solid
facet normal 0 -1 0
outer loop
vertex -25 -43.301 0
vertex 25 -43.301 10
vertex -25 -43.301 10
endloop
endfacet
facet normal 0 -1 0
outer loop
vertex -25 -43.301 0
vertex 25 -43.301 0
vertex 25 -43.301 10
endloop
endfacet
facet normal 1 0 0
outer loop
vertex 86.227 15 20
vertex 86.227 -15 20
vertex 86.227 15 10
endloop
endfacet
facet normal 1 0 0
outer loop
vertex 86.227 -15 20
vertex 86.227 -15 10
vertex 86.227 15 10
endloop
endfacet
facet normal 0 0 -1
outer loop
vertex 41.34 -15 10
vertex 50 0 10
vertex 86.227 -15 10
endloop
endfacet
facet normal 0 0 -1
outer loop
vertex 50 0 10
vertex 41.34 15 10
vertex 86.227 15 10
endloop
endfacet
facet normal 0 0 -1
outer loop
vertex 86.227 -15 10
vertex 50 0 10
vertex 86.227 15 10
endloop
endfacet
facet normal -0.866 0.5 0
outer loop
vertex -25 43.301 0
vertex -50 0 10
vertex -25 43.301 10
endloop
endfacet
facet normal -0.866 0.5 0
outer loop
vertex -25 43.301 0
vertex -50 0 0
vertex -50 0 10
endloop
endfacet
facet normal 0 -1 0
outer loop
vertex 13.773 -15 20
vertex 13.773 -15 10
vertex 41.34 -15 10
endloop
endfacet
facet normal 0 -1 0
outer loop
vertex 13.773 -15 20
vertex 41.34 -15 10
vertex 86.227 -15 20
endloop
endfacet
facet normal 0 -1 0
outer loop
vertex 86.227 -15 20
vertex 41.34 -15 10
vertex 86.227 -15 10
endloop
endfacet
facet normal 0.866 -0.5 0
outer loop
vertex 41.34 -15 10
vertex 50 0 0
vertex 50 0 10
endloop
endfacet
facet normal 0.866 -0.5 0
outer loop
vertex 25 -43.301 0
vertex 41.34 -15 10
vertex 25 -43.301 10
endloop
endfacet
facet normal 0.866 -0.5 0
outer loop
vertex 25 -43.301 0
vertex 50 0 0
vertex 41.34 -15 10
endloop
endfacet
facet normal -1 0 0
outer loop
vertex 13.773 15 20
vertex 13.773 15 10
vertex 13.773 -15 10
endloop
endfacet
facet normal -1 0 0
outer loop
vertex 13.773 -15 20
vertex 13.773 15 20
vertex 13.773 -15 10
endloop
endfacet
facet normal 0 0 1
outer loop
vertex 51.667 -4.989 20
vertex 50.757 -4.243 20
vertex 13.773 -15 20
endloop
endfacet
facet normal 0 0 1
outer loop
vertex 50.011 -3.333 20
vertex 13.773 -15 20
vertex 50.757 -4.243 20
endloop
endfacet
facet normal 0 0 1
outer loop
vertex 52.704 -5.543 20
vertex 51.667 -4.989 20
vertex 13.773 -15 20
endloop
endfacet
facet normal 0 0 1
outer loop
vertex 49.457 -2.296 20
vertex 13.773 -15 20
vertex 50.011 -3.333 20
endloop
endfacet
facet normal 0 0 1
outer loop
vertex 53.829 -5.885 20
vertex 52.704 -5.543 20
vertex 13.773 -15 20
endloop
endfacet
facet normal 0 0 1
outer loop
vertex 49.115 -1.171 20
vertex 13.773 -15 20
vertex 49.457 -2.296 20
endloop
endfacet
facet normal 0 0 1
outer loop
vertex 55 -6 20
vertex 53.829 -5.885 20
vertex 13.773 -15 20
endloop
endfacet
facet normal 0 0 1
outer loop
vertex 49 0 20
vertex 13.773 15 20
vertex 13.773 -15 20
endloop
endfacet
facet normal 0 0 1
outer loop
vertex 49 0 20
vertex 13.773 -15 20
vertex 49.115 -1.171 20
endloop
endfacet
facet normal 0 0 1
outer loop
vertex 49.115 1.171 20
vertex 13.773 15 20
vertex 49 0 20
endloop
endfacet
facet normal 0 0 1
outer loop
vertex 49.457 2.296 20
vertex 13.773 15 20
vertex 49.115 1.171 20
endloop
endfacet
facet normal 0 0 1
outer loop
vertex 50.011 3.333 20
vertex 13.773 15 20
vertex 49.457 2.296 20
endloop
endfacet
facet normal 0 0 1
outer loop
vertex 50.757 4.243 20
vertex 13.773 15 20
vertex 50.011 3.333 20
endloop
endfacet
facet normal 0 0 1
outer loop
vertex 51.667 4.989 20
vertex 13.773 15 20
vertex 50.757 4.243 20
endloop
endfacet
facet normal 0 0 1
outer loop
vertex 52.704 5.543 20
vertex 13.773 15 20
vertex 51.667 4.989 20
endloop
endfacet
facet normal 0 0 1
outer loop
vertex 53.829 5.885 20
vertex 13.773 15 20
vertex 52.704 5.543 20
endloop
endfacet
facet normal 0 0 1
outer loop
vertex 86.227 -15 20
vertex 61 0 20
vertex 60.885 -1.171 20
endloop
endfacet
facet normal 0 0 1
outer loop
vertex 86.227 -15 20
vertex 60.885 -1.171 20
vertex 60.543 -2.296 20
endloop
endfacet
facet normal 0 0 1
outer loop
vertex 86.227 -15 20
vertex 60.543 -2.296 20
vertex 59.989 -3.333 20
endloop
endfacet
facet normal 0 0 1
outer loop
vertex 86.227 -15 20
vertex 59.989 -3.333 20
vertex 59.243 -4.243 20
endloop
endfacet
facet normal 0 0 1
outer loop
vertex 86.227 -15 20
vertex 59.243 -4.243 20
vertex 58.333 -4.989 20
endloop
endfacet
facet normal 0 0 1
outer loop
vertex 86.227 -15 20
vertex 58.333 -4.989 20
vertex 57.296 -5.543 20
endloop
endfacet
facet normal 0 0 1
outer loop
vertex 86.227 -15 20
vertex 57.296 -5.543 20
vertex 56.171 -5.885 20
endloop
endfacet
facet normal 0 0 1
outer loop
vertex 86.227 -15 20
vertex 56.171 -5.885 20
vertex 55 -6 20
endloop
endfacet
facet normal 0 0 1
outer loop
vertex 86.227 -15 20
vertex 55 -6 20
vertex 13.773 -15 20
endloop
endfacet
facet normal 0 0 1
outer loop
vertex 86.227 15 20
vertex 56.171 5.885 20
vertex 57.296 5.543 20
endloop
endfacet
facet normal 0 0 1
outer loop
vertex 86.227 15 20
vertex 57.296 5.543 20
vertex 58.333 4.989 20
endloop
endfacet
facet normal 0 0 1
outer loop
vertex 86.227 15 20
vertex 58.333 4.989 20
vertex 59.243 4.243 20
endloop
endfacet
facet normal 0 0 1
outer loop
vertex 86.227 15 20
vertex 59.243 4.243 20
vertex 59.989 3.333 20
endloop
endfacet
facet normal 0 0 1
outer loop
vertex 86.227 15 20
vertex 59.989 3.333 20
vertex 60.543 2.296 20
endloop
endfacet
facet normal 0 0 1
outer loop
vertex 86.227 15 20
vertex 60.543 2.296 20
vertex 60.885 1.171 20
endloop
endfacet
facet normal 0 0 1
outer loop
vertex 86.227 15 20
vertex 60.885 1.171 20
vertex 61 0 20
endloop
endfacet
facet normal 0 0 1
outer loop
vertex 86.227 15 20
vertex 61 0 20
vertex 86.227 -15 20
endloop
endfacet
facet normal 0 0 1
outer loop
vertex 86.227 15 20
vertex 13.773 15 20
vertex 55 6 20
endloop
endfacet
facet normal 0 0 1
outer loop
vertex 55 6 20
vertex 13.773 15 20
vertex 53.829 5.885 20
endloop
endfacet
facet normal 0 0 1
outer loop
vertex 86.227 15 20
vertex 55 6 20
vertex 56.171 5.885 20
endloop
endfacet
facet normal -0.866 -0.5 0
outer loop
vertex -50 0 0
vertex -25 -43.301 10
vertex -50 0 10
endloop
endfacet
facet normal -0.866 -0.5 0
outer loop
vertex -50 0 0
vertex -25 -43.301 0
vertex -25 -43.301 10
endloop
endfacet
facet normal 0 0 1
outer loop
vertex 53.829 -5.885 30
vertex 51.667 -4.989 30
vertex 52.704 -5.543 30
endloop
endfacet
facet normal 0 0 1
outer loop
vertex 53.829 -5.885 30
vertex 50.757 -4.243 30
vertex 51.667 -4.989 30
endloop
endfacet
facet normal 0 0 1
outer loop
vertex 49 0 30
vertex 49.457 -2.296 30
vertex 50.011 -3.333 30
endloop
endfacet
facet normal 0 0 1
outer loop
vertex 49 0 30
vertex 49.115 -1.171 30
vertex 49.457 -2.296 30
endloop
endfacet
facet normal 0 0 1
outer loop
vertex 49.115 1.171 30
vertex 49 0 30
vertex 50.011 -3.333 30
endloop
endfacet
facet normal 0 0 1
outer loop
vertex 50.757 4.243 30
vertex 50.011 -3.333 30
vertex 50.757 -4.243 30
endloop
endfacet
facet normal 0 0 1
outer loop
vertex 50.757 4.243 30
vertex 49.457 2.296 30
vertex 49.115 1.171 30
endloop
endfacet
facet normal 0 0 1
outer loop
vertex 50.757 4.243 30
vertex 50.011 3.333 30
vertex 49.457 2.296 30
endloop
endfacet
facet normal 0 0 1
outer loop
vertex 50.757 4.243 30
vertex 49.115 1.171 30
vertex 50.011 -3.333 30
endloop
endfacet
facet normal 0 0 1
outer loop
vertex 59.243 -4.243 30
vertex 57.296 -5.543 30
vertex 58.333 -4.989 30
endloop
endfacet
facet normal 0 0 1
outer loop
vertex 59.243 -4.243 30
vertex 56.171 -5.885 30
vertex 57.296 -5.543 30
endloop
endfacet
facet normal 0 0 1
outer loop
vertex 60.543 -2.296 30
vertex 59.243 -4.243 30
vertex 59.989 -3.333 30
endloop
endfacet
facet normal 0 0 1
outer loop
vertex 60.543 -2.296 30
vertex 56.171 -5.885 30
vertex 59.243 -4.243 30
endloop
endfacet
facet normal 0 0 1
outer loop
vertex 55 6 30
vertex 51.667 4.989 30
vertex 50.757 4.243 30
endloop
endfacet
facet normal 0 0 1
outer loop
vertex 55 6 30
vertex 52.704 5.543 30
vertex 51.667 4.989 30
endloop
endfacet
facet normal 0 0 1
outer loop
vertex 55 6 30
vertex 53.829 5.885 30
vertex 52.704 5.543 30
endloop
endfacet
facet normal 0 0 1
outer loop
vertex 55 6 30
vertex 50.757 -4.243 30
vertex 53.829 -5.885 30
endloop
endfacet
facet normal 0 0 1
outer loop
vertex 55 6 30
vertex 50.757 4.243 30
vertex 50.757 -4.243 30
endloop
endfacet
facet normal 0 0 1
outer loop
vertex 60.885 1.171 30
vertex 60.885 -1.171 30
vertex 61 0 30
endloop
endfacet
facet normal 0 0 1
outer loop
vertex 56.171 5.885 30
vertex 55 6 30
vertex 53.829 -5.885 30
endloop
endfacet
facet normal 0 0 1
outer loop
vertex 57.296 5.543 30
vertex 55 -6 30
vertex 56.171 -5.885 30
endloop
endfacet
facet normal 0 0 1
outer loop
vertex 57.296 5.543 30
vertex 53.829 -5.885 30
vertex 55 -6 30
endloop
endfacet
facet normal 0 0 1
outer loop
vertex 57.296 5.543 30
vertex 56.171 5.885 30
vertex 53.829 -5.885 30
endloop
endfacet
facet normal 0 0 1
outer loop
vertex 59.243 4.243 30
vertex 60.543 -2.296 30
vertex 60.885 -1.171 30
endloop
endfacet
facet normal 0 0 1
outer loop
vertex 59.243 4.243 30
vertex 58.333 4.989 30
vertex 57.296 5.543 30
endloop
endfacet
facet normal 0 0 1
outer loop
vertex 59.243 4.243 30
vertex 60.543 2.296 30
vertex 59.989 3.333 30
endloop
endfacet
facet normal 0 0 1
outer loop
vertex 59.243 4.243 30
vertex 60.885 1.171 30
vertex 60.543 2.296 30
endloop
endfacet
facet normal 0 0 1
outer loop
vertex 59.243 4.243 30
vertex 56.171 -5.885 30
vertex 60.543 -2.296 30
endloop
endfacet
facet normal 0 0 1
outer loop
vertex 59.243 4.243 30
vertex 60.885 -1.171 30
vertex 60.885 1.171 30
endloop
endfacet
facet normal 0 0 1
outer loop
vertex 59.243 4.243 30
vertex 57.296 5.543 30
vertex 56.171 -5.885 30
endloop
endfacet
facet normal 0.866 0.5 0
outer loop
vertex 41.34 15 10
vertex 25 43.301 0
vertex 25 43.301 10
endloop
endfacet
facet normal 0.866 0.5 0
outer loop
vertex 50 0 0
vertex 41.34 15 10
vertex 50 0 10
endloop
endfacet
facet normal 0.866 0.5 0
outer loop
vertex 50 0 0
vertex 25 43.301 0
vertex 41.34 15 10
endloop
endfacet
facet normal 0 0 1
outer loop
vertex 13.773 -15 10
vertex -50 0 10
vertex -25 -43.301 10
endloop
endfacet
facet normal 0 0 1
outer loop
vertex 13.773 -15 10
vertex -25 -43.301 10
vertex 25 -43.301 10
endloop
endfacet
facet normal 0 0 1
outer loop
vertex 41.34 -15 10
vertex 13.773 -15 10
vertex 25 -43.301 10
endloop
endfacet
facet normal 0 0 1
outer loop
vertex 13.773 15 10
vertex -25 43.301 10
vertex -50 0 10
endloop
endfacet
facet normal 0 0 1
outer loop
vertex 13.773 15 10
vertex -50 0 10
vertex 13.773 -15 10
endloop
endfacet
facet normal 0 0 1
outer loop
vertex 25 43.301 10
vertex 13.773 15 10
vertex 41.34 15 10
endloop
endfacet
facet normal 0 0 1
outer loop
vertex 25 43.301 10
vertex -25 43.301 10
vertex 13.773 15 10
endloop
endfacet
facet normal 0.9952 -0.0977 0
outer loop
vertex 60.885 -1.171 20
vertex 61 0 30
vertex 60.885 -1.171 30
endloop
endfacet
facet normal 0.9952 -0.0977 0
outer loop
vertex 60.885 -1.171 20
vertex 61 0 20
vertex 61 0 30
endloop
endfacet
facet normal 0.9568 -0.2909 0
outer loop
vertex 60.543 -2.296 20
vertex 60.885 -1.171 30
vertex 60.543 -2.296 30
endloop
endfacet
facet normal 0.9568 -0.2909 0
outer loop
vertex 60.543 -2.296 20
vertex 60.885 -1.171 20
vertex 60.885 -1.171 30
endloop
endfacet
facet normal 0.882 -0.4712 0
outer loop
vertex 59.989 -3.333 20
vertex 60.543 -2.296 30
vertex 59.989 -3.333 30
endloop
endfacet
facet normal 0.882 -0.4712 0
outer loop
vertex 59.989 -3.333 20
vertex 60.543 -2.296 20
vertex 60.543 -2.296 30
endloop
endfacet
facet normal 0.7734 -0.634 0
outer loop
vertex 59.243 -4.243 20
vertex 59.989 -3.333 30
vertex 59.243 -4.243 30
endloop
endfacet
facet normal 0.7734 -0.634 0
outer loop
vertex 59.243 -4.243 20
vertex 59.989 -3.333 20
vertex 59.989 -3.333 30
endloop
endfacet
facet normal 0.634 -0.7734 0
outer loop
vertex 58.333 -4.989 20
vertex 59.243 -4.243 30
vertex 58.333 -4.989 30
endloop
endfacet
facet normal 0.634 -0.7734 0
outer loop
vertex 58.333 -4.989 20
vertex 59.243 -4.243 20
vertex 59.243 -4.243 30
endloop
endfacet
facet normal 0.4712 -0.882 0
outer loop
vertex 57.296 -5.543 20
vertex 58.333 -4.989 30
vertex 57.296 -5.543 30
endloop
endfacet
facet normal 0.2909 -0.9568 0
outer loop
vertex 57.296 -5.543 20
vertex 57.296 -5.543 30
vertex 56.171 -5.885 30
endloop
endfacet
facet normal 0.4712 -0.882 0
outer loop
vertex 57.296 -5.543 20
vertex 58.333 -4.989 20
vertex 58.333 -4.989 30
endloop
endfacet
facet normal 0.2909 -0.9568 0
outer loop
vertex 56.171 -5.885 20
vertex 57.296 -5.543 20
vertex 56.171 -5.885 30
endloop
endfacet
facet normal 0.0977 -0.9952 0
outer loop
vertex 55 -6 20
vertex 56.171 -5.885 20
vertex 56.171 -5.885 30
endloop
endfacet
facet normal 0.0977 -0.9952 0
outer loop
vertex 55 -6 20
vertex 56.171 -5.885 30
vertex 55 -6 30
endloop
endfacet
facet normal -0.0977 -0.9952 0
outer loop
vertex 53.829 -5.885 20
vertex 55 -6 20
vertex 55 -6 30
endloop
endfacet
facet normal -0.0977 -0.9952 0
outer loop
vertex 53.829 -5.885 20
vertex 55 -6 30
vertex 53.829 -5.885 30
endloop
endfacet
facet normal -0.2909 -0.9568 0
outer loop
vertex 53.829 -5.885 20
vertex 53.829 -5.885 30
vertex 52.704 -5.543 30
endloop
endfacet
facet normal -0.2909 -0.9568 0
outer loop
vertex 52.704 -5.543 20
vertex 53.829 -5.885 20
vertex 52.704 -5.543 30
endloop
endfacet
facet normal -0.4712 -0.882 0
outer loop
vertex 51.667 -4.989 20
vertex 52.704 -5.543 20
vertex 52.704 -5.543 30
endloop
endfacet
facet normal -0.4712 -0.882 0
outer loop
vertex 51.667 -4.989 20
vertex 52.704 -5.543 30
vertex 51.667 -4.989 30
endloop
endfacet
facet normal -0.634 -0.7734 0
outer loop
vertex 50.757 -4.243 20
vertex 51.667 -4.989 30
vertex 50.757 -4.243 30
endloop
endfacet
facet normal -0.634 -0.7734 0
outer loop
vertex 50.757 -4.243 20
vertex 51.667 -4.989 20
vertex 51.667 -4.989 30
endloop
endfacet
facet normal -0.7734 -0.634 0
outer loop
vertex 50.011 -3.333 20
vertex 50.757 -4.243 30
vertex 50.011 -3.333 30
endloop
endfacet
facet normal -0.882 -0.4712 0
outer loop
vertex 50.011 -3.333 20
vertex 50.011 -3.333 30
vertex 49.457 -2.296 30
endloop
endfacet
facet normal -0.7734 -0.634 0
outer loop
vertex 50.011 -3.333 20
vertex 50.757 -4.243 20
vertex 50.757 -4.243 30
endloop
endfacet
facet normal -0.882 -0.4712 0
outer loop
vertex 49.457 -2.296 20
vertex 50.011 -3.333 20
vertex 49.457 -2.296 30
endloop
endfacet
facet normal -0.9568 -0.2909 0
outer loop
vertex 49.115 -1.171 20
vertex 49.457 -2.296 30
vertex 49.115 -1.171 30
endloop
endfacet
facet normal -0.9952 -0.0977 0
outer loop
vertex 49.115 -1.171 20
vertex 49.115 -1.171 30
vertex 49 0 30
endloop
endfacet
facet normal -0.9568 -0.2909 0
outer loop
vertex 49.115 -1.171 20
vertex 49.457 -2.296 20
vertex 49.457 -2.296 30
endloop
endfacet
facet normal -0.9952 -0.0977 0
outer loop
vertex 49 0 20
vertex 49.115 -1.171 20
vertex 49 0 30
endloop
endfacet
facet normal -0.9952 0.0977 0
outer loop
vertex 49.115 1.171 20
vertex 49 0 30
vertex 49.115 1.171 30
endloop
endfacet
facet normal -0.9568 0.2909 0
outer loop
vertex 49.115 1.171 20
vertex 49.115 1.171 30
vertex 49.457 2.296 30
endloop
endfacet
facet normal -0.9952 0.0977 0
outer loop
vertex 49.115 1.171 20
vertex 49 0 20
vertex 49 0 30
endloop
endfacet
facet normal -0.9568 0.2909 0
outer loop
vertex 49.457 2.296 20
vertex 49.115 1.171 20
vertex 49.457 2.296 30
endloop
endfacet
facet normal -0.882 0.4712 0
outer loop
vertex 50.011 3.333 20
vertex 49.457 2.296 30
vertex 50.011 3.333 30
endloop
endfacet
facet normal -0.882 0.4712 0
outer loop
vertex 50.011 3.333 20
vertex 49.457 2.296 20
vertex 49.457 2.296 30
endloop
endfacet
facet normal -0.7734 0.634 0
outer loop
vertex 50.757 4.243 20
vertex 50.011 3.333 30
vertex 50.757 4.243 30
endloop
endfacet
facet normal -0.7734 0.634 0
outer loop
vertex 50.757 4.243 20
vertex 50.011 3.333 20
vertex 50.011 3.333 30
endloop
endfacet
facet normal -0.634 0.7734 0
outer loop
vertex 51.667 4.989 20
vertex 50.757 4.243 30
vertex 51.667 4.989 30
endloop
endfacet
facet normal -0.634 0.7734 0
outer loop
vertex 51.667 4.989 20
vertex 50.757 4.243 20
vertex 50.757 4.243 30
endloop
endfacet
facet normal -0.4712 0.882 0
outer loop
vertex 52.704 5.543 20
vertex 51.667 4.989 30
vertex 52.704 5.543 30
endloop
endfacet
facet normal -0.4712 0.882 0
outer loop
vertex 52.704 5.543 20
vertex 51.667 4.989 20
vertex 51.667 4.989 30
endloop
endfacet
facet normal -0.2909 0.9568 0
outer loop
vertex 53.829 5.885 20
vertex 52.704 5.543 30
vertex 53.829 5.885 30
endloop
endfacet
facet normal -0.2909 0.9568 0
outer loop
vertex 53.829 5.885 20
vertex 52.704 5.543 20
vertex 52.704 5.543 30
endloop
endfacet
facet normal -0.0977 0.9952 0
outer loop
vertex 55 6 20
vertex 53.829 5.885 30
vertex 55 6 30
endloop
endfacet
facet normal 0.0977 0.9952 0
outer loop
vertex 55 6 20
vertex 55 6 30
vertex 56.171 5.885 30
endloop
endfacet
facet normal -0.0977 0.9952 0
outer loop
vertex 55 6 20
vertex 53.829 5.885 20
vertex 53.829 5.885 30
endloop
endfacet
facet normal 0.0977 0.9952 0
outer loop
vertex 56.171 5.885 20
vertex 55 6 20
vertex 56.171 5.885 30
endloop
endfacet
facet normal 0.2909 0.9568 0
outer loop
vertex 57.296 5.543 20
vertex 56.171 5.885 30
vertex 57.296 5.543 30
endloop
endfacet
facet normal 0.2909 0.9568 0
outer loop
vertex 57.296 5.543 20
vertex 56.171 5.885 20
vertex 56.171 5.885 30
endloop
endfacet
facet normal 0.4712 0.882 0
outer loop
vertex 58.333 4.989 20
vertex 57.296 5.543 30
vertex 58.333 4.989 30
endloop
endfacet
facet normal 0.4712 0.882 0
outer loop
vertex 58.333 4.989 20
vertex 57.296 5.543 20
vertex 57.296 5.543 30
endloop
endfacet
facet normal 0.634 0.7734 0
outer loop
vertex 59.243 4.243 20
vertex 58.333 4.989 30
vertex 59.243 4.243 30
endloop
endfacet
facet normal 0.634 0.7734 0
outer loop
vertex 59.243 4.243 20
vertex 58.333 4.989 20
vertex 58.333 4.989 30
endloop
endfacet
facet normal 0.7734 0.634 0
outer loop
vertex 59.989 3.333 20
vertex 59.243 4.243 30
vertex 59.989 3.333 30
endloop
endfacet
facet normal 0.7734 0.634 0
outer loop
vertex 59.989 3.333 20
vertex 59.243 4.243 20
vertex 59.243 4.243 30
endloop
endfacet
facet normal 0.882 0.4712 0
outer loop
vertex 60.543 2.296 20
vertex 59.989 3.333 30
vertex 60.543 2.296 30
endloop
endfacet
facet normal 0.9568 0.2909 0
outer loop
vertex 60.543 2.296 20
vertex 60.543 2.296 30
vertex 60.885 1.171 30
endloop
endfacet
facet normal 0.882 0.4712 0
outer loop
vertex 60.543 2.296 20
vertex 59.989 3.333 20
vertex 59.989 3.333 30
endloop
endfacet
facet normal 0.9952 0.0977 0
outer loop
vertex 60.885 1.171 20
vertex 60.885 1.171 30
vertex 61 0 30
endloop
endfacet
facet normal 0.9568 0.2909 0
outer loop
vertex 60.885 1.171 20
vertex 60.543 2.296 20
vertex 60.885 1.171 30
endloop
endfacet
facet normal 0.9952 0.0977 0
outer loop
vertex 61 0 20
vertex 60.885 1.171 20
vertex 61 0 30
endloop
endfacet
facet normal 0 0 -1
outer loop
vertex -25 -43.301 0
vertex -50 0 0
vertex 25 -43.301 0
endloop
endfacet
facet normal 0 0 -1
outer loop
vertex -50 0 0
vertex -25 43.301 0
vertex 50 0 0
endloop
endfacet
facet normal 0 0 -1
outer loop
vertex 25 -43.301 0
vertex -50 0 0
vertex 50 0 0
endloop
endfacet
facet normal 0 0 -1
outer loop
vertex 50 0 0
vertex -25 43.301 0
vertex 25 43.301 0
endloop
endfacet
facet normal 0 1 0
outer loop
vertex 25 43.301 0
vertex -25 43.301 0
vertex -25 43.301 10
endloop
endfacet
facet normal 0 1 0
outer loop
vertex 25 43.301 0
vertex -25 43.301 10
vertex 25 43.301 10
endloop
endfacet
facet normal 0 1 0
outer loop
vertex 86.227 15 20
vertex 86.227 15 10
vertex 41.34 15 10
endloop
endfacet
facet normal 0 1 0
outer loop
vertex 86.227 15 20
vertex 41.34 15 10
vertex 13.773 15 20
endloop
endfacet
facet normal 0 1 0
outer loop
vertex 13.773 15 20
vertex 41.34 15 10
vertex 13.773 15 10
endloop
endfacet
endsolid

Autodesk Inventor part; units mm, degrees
ref_plane "YZ Plane" through (0, 0, 0) normal (1, 0, 0) x (0, 1, 0)
ref_plane "XZ Plane" through (0, 0, 0) normal (0, 1, 0) x (-1, 0, 0)
ref_plane "XY Plane" through (0, 0, 0) normal (0, 0, 1) x (1, 0, 0)
sketch "Boceto1" plane through (0, 0, 0) normal (0, 0, 1) x (1, 0, 0)
  line L0 (50, 0) -> (25, -43.3013)
  line L1 (25, -43.3013) -> (-25, -43.3013)
  line L2 (-25, -43.3013) -> (-50, 0)
  line L3 (-50, 0) -> (-25, 43.3013)
  line L4 (-25, 43.3013) -> (25, 43.3013)
  line L5 (25, 43.3013) -> (50, 0)
  point P0 (0, 0)
  point P1 (0, 0)
  dimension "d3" = 50
extrude "Extrusión1" add sketch "Boceto1" along normal blind 10
sketch "Boceto2" plane through (0, 0, 10) normal (0, 0, 1) x (1, 0, 0)
  line L0 (13.773, -15) -> (86.227, -15)
  line L1 (86.227, -15) -> (86.227, 15)
  line L2 (86.227, 15) -> (13.773, 15)
  line L3 (13.773, 15) -> (13.773, -15)
  line L4 (25, -43.3013) -> (50, 0) projected
  line L5 (13.773, -15) -> (86.227, 15) construction
  line L6 (86.227, -15) -> (13.773, 15) construction
  dimension "d7" = 30
  dimension "d8" = 72.454
extrude "Extrusión2" add sketch "Boceto2" along normal blind 10
sketch "Boceto3" plane through (0, 0, 20) normal (0, 0, 1) x (1, 0, 0)
  line L0 (13.773, 15) -> (41.3397, 15) projected
  line L1 (41.3397, 15) -> (25, 43.3013) projected
  line L2 (25, 43.3013) -> (-25, 43.3013) projected
  line L3 (-25, 43.3013) -> (-50, 0) projected
  line L4 (-50, 0) -> (-25, -43.3013) projected
  line L5 (-25, -43.3013) -> (25, -43.3013) projected
  line L6 (25, -43.3013) -> (41.3397, -15) projected
  line L7 (41.3397, -15) -> (13.773, -15) projected
  line L8 (13.773, -15) -> (13.773, 15) projected
  line L9 (0, 0) -> (55, 0)
  circle A0 centre (55, 0) radius 6
  line L10 (13.773, 15) -> (41.3397, 15) projected
  line L11 (41.3397, 15) -> (25, 43.3013) projected
  line L12 (25, 43.3013) -> (-25, 43.3013) projected
  line L13 (-25, 43.3013) -> (-50, 0) projected
  line L14 (-50, 0) -> (-25, -43.3013) projected
  line L15 (-25, -43.3013) -> (25, -43.3013) projected
  line L16 (25, -43.3013) -> (41.3397, -15) projected
  line L17 (41.3397, -15) -> (13.773, -15) projected
  line L18 (13.773, -15) -> (13.773, 15) projected
  line L19 (13.773, 15) -> (41.3397, 15) projected
  line L20 (41.3397, 15) -> (25, 43.3013) projected
  line L21 (25, 43.3013) -> (-25, 43.3013) projected
  line L22 (-25, 43.3013) -> (-50, 0) projected
  line L23 (-50, 0) -> (-25, -43.3013) projected
  line L24 (-25, -43.3013) -> (25, -43.3013) projected
  line L25 (25, -43.3013) -> (41.3397, -15) projected
  line L26 (41.3397, -15) -> (13.773, -15) projected
  line L27 (13.773, -15) -> (13.773, 15) projected
  line L28 (86.227, 15) -> (13.773, 15) projected
  dimension "d9" = 55
  dimension "d10" = 12
extrude "Extrusión3" add sketch "Boceto3" along normal blind 10 contours A0
properties part number "base"
